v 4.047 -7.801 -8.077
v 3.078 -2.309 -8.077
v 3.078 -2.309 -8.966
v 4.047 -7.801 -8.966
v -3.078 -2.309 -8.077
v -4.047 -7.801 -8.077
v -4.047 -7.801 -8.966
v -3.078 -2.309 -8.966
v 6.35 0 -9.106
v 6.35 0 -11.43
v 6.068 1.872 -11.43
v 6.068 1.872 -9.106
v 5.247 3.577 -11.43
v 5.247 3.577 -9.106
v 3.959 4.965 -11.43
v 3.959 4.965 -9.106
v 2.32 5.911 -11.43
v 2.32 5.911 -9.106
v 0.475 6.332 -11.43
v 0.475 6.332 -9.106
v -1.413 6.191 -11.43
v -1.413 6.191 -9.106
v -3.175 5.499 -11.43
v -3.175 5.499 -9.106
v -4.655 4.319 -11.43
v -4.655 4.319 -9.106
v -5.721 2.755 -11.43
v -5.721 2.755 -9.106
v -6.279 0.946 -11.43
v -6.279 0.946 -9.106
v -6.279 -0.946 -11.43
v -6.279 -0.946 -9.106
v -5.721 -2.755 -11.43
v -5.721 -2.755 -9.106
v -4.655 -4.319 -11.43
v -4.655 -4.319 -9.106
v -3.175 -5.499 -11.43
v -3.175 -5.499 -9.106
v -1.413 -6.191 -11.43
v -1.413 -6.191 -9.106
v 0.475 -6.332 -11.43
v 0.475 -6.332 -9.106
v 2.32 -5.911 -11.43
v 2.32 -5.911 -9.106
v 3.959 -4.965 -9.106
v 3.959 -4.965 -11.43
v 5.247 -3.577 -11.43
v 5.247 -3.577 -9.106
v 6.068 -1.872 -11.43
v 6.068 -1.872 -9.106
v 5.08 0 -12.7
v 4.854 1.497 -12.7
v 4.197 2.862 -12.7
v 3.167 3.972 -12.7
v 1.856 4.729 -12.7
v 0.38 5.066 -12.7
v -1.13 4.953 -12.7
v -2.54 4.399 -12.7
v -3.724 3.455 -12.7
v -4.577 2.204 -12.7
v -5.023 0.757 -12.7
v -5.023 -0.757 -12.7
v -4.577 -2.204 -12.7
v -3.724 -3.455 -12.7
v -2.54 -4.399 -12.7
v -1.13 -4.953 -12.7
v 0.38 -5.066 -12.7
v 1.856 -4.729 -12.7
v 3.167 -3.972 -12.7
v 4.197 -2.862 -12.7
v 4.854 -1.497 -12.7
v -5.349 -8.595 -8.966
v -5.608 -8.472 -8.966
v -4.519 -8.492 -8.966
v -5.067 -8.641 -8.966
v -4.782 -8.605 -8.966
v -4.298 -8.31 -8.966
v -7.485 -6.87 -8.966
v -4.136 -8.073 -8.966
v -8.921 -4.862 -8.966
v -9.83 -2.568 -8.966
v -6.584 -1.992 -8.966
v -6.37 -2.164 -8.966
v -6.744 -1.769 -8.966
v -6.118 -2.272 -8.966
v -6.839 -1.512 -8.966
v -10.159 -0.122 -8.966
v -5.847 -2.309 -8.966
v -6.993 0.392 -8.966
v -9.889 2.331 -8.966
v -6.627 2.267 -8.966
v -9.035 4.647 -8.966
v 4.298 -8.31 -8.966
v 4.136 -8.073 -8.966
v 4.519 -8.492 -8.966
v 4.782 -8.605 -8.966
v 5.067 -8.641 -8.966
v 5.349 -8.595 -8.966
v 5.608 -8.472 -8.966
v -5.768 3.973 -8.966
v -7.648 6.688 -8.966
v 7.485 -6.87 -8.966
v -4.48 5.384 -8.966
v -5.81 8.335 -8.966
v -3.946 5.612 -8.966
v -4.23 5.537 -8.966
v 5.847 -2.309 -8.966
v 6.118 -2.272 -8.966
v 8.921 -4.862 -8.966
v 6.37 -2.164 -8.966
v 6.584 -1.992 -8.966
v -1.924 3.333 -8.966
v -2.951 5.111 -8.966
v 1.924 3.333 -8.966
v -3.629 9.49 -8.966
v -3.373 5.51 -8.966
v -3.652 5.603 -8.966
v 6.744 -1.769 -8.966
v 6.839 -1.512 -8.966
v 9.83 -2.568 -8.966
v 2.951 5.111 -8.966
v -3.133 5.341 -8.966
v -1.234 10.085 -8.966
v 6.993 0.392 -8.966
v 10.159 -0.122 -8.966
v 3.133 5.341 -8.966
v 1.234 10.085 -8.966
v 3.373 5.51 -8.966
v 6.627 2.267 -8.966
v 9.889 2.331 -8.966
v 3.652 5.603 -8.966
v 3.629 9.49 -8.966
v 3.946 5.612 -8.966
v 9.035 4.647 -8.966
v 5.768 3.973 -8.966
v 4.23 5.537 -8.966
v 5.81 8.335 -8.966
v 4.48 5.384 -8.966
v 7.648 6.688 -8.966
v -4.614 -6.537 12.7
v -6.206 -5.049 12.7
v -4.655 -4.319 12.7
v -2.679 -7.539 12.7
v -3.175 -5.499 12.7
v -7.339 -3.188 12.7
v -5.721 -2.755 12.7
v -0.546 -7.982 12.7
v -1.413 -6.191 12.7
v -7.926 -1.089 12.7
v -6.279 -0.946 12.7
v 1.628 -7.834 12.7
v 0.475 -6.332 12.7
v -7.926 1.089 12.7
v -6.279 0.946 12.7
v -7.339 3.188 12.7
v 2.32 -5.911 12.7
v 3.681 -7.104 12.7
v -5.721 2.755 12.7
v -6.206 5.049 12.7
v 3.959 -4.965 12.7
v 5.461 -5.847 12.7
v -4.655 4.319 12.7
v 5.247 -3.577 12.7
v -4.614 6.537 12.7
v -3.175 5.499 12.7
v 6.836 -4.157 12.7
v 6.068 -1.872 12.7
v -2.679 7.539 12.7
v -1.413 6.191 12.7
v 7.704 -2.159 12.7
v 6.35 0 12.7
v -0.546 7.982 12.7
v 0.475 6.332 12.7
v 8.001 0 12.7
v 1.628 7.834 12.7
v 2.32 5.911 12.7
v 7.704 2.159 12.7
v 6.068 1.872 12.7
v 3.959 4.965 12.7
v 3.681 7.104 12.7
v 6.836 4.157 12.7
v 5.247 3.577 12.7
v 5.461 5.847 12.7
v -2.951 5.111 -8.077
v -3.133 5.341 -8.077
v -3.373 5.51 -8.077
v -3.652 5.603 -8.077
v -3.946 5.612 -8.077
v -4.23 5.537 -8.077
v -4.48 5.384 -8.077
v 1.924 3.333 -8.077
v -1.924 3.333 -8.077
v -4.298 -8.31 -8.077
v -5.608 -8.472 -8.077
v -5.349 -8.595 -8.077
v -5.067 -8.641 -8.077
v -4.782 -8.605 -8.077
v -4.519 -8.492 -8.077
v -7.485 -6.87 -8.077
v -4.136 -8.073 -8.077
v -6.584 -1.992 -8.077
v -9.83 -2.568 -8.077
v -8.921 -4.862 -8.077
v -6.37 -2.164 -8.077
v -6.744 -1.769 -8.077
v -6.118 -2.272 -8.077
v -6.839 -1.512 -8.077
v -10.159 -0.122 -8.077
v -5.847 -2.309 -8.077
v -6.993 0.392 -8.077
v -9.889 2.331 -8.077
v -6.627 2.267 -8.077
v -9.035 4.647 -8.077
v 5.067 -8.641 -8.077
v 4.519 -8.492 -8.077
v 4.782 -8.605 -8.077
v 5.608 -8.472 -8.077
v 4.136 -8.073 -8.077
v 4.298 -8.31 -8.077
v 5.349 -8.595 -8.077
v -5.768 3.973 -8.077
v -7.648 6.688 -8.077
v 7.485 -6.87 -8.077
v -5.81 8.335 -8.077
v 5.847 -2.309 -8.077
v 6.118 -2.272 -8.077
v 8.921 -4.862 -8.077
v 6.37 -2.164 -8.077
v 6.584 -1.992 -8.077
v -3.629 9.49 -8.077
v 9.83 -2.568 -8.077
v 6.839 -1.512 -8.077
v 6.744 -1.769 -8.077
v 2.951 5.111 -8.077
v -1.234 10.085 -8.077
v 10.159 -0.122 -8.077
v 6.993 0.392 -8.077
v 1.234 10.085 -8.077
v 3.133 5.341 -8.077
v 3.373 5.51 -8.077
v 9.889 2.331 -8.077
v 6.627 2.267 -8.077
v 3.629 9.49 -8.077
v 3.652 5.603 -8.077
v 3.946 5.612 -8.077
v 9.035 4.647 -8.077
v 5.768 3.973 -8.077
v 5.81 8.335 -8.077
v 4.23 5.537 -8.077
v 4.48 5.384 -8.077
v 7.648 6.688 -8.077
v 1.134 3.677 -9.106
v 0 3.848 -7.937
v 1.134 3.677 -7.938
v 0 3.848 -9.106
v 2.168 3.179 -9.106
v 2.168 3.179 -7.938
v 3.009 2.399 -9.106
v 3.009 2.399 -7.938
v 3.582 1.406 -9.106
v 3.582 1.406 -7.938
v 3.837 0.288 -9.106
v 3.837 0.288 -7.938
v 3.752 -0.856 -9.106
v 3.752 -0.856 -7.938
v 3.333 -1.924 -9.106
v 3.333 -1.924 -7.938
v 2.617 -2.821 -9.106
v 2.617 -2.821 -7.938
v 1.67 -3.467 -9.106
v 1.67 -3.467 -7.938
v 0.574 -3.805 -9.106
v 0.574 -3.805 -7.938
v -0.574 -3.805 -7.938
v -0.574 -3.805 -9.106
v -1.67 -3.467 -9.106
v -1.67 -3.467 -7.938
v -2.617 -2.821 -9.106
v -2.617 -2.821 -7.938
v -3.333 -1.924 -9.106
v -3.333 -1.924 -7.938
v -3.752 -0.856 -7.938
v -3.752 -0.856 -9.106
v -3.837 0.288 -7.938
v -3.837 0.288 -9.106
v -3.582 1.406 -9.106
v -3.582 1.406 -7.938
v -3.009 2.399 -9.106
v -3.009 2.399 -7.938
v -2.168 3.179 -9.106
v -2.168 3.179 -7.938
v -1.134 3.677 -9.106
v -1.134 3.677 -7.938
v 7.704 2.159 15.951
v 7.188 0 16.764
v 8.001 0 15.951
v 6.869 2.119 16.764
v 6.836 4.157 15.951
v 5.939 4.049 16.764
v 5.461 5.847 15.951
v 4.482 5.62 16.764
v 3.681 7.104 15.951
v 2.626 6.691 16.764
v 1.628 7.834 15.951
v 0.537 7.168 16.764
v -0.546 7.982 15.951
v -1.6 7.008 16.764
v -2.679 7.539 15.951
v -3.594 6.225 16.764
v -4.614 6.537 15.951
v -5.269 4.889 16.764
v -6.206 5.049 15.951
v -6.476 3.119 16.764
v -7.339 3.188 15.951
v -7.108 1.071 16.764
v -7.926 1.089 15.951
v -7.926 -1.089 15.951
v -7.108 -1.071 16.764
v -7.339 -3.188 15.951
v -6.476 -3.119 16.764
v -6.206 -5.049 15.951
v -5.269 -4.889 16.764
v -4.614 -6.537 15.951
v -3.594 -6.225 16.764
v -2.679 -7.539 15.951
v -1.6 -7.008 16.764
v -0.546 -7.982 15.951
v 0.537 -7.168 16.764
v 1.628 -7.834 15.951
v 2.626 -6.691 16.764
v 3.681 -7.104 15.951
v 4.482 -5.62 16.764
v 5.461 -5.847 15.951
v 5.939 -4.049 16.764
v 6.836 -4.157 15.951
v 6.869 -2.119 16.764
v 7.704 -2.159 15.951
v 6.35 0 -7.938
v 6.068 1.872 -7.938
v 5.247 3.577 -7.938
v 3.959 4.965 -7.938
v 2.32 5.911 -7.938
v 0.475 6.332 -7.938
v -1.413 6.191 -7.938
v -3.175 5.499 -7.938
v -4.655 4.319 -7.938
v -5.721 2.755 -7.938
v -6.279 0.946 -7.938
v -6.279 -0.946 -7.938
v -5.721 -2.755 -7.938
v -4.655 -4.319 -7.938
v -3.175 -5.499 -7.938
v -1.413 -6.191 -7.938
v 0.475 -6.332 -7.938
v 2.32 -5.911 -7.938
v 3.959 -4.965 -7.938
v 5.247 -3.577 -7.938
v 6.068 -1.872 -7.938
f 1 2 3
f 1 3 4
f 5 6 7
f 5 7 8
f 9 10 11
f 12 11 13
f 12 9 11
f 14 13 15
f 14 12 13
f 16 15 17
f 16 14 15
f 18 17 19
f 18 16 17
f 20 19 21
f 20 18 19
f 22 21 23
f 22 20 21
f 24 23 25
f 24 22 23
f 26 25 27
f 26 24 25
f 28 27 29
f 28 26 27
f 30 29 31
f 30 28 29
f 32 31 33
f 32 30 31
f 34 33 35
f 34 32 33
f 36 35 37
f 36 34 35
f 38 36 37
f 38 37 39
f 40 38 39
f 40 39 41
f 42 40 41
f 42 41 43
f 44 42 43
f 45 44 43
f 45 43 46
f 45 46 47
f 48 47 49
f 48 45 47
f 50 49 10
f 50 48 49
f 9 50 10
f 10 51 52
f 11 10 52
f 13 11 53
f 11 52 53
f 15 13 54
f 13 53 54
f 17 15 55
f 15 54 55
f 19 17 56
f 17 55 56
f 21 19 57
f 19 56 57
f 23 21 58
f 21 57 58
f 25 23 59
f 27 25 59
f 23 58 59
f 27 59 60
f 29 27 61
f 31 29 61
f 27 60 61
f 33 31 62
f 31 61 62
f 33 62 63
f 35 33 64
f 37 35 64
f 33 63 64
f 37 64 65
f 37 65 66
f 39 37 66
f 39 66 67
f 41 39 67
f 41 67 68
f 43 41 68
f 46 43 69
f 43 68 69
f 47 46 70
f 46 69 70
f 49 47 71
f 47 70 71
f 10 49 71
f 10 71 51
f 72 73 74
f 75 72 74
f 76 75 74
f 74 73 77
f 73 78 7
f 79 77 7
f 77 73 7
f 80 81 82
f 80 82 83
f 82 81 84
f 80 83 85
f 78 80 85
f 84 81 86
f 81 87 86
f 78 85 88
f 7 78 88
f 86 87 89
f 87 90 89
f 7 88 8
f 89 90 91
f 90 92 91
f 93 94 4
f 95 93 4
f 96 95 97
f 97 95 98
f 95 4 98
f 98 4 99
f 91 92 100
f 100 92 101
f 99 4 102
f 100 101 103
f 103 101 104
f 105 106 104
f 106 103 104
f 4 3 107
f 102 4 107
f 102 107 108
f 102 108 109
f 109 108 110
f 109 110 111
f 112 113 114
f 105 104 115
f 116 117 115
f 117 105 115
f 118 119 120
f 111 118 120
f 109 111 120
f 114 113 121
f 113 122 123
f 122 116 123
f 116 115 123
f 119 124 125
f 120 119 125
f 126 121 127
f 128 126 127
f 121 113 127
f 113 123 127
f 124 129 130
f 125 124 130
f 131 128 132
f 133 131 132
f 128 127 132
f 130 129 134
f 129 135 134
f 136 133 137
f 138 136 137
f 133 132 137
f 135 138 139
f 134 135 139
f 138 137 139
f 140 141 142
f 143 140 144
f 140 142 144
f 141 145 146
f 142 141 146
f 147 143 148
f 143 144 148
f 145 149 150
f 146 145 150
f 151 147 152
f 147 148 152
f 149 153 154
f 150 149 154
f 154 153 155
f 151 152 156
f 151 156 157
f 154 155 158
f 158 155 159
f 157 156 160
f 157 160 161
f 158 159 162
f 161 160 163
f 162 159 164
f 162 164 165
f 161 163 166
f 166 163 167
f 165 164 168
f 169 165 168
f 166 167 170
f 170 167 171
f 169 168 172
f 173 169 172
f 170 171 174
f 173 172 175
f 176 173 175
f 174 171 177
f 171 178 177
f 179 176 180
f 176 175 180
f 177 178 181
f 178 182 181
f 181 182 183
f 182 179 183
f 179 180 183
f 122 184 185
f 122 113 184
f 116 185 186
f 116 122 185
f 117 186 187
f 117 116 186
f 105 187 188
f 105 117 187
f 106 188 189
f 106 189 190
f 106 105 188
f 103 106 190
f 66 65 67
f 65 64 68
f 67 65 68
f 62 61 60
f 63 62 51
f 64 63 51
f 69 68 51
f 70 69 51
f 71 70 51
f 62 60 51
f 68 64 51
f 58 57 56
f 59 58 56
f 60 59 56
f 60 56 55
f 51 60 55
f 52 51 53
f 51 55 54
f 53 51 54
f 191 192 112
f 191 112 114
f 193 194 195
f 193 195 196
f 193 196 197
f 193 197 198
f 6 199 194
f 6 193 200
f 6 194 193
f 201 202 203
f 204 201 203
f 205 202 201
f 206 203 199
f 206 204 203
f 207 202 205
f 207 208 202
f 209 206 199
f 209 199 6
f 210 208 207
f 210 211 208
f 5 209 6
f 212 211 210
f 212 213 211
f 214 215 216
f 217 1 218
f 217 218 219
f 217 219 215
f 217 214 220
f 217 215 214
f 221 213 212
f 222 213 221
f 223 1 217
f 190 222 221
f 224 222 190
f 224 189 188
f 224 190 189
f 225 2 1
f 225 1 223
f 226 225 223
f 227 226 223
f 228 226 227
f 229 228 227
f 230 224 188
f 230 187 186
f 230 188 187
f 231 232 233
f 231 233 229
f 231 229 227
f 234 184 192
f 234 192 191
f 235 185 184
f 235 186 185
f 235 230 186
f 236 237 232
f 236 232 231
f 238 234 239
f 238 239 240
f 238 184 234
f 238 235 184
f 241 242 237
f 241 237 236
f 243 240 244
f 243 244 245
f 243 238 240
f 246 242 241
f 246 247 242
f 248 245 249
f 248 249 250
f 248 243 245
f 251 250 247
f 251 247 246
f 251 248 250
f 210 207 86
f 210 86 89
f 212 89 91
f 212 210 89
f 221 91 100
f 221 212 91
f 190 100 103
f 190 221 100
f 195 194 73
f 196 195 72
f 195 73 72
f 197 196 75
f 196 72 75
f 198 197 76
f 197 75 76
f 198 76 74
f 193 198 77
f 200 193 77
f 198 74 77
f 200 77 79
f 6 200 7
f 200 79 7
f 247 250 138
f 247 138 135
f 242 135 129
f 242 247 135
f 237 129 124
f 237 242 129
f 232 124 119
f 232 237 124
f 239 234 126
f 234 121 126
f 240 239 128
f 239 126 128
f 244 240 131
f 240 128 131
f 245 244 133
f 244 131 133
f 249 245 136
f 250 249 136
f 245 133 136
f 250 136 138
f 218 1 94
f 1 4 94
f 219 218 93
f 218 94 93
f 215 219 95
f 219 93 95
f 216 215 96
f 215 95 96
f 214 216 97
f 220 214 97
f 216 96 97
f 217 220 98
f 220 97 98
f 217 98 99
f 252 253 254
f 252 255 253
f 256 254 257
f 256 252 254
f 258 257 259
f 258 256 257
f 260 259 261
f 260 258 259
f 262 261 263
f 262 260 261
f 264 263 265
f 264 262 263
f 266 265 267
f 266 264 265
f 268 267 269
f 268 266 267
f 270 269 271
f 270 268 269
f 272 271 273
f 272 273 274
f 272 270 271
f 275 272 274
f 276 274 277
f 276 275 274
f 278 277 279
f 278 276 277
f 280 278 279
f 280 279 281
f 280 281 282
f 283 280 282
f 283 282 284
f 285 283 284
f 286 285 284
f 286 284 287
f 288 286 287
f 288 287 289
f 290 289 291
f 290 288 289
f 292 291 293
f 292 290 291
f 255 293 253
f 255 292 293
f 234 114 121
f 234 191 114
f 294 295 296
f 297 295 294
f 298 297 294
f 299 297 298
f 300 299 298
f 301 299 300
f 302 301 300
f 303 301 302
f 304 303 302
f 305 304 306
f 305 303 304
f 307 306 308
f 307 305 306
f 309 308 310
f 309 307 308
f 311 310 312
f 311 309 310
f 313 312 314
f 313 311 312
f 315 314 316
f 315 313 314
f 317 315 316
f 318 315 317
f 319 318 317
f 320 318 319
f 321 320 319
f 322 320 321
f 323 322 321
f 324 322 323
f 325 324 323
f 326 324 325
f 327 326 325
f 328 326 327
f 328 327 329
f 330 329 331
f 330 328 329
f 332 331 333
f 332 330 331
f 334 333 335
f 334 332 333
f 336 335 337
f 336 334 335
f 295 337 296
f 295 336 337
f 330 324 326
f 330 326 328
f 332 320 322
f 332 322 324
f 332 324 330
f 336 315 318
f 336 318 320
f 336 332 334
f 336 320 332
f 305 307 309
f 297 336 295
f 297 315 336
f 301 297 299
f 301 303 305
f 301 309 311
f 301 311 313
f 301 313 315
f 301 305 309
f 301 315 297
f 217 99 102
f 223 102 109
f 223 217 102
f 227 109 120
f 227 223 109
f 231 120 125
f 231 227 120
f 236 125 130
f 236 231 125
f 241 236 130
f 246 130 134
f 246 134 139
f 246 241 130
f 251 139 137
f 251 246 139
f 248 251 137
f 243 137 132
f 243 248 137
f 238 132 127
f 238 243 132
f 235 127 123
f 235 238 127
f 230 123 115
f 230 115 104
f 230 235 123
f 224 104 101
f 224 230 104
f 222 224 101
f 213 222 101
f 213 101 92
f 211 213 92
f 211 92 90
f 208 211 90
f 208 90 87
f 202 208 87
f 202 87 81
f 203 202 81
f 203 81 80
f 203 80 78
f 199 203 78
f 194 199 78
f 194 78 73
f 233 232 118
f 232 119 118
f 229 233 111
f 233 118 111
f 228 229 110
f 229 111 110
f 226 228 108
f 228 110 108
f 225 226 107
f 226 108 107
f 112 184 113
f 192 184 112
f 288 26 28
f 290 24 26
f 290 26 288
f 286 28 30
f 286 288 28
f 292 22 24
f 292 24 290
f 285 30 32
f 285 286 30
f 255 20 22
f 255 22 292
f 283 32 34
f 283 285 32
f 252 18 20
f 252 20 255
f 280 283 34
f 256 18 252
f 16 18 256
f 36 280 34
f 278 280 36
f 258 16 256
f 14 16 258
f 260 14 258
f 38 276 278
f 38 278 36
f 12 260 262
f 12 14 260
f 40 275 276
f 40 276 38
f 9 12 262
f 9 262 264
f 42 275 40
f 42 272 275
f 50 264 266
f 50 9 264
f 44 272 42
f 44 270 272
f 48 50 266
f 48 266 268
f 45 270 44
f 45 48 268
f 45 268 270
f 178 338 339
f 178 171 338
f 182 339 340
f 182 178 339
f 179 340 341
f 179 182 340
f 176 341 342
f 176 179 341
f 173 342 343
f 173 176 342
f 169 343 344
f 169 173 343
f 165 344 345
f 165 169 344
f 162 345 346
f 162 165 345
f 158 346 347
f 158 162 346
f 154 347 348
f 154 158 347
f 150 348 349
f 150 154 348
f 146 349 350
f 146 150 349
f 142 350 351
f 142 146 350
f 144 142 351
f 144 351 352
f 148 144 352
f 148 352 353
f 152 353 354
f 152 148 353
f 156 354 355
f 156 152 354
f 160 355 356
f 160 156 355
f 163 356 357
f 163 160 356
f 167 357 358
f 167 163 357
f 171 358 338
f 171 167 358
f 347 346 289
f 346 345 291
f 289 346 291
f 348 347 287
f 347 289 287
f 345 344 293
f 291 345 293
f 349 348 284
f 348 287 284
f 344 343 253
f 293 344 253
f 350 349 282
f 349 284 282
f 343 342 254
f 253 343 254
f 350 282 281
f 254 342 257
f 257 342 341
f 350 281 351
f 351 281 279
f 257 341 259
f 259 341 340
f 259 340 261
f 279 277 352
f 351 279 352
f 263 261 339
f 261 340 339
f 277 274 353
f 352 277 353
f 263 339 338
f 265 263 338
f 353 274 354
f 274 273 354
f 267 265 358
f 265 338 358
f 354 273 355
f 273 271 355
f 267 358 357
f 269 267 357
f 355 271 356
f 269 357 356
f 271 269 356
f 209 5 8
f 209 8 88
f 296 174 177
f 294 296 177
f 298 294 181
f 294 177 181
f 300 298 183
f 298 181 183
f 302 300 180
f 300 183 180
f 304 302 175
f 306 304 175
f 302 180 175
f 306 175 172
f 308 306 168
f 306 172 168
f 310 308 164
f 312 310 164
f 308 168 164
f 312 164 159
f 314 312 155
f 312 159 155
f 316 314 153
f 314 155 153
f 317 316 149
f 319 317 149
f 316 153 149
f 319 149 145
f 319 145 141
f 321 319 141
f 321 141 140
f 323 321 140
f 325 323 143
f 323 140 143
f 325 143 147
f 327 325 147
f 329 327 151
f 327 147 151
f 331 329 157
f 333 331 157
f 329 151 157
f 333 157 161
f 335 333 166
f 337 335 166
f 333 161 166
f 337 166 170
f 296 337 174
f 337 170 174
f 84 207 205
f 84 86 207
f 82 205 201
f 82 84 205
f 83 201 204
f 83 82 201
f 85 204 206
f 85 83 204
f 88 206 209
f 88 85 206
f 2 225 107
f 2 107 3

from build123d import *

# Parameters (mm, degrees)
SKETCH2_R      = 6.35
EXTRUDE1_DEPTH = 12.7
SKETCH3_W      = 1.1684
SKETCH3_H      = 2.5019
SKETCH8_R      = 8.001
EXTRUDE6_DEPTH = 4.064
CHAMFER2_SIZE  = 0.8128
SKETCH4_R      = 10.16
SKETCH4_R_2    = 3.8481
EXTRUDE2_DEPTH = 0.4445
EXTRUDE4_DEPTH = 13.7
EXTRUDE5_DEPTH = 0.889
FILLET1_R      = 1.016
CHAMFER1_SIZE  = 1.27


with BuildPart() as part:
    # Sketch2 → Extrude1 (new body, symmetric)
    with BuildSketch(Plane.XY):
        Circle(SKETCH2_R)
    extrude(amount=EXTRUDE1_DEPTH, both=True)

    # Sketch3 → Cut-Revolve1 (revolve, cut)
    with BuildSketch(Plane(origin=(0, 0, 0), x_dir=(0, 0, -1), z_dir=(1, 0, 0))):
        with Locations((8.5217, 5.09905)):
            Rectangle(SKETCH3_W, SKETCH3_H)
    revolve(axis=Axis((0, 0, 12.7), (0, 0, -1)), mode=Mode.SUBTRACT)

    # Sketch8 → Extrude6 (add)
    with BuildSketch(Plane.XY.offset(12.7)):
        Circle(SKETCH8_R)
    extrude(amount=EXTRUDE6_DEPTH)

    # Chamfer2
    chamfer2_edges = [part.edges().sort_by_distance(p)[0] for p in [
        (-8.001, 0, 16.764),
    ]]
    chamfer(chamfer2_edges, length=CHAMFER2_SIZE)

    # Chamfer1
    chamfer1_edges = [part.edges().sort_by_distance(p)[0] for p in [
        (-6.35, 0, -12.7),
    ]]
    chamfer(chamfer1_edges, length=CHAMFER1_SIZE)


with BuildPart() as body_2:
    # Sketch4 → Extrude2 (new body, symmetric)
    with BuildSketch(Plane.XY.offset(-8.5217)):
        Circle(SKETCH4_R)
        Circle(SKETCH4_R_2, mode=Mode.SUBTRACT)
    extrude(amount=EXTRUDE2_DEPTH, both=True)

    # Sketch5 → Extrude4 (cut, through all)
    with BuildSketch(Plane.XY):
        with BuildLine():
            Line((-3.502025, 6.065685229), (0, 0))
            Line((0, 0), (3.502025, 6.065685229))
            ThreePointArc((3.502025, 6.065685229), (6.565777443, 2.438705183), (6.61255487, -2.30886))
            Line((6.61255487, -2.30886), (3.07848, -2.30886))
            Line((3.07848, -2.30886), (4.294908828, -9.207570698))
            ThreePointArc((4.294908828, -9.207570698), (0, -10.16), (-4.294908828, -9.207570698))
            Line((-4.294908828, -9.207570698), (-3.07848, -2.30886))
            Line((-3.07848, -2.30886), (-6.61255487, -2.30886))
            ThreePointArc((-6.61255487, -2.30886), (-6.565777443, 2.438705183), (-3.502025, 6.065685229))
        make_face()
    extrude(amount=-EXTRUDE4_DEPTH, mode=Mode.SUBTRACT)

    # Sketch6 → Extrude5 (add)
    with BuildSketch(Plane.XY.offset(-8.0772)):
        with BuildLine():
            Line((-1.92405, 3.332552356), (1.92405, 3.332552356))
            ThreePointArc((1.92405, 3.332552356), (0, 3.8481), (-1.92405, 3.332552356))
        make_face()
    extrude(amount=-EXTRUDE5_DEPTH)

    # Fillet1
    fillet1_edges = [body_2.edges().sort_by_distance(p)[0] for p in [
        (3.502025, 6.065685229, -8.5217),
        (4.294908828, -9.207570698, -8.5217),
        (-6.61255487, -2.30886, -8.5217),
        (6.61255487, -2.30886, -8.5217),
        (-4.294908828, -9.207570698, -8.5217),
        (-3.502025, 6.065685229, -8.5217),
    ]]
    fillet(fillet1_edges, radius=FILLET1_R)


solid = Compound([part.part, body_2.part])
